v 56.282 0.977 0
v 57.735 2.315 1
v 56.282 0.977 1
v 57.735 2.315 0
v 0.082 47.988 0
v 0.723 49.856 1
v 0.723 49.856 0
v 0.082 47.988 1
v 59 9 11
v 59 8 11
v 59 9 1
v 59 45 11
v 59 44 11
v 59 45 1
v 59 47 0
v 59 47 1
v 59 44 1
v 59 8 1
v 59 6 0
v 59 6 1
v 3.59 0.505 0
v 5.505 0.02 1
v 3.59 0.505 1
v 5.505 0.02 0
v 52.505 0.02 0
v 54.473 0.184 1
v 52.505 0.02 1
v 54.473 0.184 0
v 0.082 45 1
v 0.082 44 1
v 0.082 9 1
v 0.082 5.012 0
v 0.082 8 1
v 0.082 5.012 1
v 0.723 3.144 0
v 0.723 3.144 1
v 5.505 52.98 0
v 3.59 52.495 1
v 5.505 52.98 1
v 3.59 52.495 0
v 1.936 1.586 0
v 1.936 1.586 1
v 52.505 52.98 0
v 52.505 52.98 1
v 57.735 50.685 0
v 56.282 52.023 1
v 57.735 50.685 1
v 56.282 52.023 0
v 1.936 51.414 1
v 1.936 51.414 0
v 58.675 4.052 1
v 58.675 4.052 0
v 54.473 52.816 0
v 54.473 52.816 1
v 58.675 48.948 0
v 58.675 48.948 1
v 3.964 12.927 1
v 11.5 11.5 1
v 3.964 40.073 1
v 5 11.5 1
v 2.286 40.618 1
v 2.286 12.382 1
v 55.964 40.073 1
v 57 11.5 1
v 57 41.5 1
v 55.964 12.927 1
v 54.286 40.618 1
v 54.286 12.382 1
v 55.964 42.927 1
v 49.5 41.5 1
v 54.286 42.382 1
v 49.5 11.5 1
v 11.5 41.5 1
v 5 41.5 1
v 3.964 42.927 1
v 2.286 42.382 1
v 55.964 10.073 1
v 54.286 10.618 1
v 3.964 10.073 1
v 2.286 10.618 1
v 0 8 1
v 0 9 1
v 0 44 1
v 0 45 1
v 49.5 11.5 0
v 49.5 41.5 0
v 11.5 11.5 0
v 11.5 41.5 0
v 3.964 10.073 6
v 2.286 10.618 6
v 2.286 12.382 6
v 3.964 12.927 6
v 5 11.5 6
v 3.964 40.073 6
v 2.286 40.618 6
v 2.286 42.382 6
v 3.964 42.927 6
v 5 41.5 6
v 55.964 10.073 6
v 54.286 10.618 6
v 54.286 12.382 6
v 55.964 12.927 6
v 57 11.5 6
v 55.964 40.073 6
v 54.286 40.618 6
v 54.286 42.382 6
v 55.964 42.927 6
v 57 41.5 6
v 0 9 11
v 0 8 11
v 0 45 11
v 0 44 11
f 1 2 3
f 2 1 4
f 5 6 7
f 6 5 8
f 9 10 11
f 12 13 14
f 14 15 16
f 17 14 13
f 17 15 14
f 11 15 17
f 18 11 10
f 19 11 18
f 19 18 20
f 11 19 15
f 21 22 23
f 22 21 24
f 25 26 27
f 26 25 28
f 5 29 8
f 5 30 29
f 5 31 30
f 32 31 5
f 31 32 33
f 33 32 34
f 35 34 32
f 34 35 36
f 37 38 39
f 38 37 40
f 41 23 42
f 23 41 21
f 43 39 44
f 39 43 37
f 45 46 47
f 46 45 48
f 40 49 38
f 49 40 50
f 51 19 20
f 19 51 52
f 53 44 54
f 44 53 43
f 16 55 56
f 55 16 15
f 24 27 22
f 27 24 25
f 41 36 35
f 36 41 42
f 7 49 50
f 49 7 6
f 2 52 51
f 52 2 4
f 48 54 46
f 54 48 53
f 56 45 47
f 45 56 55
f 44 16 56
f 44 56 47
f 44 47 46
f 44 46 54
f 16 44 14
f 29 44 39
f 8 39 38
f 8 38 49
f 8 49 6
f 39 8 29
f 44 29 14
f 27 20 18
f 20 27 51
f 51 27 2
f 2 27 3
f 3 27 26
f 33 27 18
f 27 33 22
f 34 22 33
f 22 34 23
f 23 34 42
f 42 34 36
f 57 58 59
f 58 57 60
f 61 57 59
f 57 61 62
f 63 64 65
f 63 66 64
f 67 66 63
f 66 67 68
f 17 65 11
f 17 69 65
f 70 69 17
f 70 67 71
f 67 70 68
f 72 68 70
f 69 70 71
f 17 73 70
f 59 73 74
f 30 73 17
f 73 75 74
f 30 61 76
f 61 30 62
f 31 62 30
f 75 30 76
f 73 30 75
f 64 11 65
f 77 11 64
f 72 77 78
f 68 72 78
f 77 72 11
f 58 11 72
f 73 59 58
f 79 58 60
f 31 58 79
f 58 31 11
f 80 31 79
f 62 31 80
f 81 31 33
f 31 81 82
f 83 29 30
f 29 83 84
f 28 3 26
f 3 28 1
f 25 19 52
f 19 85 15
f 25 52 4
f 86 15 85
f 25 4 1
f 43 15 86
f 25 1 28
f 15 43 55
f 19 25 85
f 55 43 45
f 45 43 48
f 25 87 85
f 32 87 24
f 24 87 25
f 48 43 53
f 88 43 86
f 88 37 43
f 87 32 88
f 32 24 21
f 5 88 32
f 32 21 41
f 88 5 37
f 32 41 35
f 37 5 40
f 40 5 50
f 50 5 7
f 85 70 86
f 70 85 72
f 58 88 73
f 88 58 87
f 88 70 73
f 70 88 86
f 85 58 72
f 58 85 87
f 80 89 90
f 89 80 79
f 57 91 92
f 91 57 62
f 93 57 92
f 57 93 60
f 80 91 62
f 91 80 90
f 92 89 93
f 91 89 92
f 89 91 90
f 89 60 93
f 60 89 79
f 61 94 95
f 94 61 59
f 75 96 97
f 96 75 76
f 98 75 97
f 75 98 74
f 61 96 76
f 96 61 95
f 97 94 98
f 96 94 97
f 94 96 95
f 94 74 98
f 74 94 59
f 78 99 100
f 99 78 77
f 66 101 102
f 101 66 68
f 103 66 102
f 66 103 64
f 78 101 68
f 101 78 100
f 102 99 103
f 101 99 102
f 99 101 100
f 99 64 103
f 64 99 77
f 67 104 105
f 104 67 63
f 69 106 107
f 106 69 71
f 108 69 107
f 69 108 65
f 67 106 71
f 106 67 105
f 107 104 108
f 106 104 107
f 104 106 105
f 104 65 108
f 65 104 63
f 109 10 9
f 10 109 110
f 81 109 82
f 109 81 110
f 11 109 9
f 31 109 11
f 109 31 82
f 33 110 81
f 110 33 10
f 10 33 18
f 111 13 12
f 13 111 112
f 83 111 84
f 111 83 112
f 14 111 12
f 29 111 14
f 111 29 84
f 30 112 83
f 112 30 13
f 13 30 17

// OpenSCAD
union(){
    difference(){
        //outside box
        translate([6,6,0]){
            minkowski(){
                cube([47,41,0.5]);
                cylinder(r=6,h=0.5);
            }
        }
        //display cutout
        translate([11.5,11.5,0]){
            cube([38,30,3]);
        }       
    }
    //mounting posts
    translate([3.5,11.5,1]){
        cylinder(r=1.5,h=5);
    }
    translate([3.5,41.5,1]){
        cylinder(r=1.5,h=5);
    }
    translate([55.5,11.5,1]){
        cylinder(r=1.5,h=5);
    }
    translate([55.5,41.5,1]){
        cylinder(r=1.5,h=5);
    }
    //side walls
    translate([0,8,1]){
        cube([59,1,10]);
    }
    translate([0,44,1]){
        cube([59,1,10]);
    }
}
       
